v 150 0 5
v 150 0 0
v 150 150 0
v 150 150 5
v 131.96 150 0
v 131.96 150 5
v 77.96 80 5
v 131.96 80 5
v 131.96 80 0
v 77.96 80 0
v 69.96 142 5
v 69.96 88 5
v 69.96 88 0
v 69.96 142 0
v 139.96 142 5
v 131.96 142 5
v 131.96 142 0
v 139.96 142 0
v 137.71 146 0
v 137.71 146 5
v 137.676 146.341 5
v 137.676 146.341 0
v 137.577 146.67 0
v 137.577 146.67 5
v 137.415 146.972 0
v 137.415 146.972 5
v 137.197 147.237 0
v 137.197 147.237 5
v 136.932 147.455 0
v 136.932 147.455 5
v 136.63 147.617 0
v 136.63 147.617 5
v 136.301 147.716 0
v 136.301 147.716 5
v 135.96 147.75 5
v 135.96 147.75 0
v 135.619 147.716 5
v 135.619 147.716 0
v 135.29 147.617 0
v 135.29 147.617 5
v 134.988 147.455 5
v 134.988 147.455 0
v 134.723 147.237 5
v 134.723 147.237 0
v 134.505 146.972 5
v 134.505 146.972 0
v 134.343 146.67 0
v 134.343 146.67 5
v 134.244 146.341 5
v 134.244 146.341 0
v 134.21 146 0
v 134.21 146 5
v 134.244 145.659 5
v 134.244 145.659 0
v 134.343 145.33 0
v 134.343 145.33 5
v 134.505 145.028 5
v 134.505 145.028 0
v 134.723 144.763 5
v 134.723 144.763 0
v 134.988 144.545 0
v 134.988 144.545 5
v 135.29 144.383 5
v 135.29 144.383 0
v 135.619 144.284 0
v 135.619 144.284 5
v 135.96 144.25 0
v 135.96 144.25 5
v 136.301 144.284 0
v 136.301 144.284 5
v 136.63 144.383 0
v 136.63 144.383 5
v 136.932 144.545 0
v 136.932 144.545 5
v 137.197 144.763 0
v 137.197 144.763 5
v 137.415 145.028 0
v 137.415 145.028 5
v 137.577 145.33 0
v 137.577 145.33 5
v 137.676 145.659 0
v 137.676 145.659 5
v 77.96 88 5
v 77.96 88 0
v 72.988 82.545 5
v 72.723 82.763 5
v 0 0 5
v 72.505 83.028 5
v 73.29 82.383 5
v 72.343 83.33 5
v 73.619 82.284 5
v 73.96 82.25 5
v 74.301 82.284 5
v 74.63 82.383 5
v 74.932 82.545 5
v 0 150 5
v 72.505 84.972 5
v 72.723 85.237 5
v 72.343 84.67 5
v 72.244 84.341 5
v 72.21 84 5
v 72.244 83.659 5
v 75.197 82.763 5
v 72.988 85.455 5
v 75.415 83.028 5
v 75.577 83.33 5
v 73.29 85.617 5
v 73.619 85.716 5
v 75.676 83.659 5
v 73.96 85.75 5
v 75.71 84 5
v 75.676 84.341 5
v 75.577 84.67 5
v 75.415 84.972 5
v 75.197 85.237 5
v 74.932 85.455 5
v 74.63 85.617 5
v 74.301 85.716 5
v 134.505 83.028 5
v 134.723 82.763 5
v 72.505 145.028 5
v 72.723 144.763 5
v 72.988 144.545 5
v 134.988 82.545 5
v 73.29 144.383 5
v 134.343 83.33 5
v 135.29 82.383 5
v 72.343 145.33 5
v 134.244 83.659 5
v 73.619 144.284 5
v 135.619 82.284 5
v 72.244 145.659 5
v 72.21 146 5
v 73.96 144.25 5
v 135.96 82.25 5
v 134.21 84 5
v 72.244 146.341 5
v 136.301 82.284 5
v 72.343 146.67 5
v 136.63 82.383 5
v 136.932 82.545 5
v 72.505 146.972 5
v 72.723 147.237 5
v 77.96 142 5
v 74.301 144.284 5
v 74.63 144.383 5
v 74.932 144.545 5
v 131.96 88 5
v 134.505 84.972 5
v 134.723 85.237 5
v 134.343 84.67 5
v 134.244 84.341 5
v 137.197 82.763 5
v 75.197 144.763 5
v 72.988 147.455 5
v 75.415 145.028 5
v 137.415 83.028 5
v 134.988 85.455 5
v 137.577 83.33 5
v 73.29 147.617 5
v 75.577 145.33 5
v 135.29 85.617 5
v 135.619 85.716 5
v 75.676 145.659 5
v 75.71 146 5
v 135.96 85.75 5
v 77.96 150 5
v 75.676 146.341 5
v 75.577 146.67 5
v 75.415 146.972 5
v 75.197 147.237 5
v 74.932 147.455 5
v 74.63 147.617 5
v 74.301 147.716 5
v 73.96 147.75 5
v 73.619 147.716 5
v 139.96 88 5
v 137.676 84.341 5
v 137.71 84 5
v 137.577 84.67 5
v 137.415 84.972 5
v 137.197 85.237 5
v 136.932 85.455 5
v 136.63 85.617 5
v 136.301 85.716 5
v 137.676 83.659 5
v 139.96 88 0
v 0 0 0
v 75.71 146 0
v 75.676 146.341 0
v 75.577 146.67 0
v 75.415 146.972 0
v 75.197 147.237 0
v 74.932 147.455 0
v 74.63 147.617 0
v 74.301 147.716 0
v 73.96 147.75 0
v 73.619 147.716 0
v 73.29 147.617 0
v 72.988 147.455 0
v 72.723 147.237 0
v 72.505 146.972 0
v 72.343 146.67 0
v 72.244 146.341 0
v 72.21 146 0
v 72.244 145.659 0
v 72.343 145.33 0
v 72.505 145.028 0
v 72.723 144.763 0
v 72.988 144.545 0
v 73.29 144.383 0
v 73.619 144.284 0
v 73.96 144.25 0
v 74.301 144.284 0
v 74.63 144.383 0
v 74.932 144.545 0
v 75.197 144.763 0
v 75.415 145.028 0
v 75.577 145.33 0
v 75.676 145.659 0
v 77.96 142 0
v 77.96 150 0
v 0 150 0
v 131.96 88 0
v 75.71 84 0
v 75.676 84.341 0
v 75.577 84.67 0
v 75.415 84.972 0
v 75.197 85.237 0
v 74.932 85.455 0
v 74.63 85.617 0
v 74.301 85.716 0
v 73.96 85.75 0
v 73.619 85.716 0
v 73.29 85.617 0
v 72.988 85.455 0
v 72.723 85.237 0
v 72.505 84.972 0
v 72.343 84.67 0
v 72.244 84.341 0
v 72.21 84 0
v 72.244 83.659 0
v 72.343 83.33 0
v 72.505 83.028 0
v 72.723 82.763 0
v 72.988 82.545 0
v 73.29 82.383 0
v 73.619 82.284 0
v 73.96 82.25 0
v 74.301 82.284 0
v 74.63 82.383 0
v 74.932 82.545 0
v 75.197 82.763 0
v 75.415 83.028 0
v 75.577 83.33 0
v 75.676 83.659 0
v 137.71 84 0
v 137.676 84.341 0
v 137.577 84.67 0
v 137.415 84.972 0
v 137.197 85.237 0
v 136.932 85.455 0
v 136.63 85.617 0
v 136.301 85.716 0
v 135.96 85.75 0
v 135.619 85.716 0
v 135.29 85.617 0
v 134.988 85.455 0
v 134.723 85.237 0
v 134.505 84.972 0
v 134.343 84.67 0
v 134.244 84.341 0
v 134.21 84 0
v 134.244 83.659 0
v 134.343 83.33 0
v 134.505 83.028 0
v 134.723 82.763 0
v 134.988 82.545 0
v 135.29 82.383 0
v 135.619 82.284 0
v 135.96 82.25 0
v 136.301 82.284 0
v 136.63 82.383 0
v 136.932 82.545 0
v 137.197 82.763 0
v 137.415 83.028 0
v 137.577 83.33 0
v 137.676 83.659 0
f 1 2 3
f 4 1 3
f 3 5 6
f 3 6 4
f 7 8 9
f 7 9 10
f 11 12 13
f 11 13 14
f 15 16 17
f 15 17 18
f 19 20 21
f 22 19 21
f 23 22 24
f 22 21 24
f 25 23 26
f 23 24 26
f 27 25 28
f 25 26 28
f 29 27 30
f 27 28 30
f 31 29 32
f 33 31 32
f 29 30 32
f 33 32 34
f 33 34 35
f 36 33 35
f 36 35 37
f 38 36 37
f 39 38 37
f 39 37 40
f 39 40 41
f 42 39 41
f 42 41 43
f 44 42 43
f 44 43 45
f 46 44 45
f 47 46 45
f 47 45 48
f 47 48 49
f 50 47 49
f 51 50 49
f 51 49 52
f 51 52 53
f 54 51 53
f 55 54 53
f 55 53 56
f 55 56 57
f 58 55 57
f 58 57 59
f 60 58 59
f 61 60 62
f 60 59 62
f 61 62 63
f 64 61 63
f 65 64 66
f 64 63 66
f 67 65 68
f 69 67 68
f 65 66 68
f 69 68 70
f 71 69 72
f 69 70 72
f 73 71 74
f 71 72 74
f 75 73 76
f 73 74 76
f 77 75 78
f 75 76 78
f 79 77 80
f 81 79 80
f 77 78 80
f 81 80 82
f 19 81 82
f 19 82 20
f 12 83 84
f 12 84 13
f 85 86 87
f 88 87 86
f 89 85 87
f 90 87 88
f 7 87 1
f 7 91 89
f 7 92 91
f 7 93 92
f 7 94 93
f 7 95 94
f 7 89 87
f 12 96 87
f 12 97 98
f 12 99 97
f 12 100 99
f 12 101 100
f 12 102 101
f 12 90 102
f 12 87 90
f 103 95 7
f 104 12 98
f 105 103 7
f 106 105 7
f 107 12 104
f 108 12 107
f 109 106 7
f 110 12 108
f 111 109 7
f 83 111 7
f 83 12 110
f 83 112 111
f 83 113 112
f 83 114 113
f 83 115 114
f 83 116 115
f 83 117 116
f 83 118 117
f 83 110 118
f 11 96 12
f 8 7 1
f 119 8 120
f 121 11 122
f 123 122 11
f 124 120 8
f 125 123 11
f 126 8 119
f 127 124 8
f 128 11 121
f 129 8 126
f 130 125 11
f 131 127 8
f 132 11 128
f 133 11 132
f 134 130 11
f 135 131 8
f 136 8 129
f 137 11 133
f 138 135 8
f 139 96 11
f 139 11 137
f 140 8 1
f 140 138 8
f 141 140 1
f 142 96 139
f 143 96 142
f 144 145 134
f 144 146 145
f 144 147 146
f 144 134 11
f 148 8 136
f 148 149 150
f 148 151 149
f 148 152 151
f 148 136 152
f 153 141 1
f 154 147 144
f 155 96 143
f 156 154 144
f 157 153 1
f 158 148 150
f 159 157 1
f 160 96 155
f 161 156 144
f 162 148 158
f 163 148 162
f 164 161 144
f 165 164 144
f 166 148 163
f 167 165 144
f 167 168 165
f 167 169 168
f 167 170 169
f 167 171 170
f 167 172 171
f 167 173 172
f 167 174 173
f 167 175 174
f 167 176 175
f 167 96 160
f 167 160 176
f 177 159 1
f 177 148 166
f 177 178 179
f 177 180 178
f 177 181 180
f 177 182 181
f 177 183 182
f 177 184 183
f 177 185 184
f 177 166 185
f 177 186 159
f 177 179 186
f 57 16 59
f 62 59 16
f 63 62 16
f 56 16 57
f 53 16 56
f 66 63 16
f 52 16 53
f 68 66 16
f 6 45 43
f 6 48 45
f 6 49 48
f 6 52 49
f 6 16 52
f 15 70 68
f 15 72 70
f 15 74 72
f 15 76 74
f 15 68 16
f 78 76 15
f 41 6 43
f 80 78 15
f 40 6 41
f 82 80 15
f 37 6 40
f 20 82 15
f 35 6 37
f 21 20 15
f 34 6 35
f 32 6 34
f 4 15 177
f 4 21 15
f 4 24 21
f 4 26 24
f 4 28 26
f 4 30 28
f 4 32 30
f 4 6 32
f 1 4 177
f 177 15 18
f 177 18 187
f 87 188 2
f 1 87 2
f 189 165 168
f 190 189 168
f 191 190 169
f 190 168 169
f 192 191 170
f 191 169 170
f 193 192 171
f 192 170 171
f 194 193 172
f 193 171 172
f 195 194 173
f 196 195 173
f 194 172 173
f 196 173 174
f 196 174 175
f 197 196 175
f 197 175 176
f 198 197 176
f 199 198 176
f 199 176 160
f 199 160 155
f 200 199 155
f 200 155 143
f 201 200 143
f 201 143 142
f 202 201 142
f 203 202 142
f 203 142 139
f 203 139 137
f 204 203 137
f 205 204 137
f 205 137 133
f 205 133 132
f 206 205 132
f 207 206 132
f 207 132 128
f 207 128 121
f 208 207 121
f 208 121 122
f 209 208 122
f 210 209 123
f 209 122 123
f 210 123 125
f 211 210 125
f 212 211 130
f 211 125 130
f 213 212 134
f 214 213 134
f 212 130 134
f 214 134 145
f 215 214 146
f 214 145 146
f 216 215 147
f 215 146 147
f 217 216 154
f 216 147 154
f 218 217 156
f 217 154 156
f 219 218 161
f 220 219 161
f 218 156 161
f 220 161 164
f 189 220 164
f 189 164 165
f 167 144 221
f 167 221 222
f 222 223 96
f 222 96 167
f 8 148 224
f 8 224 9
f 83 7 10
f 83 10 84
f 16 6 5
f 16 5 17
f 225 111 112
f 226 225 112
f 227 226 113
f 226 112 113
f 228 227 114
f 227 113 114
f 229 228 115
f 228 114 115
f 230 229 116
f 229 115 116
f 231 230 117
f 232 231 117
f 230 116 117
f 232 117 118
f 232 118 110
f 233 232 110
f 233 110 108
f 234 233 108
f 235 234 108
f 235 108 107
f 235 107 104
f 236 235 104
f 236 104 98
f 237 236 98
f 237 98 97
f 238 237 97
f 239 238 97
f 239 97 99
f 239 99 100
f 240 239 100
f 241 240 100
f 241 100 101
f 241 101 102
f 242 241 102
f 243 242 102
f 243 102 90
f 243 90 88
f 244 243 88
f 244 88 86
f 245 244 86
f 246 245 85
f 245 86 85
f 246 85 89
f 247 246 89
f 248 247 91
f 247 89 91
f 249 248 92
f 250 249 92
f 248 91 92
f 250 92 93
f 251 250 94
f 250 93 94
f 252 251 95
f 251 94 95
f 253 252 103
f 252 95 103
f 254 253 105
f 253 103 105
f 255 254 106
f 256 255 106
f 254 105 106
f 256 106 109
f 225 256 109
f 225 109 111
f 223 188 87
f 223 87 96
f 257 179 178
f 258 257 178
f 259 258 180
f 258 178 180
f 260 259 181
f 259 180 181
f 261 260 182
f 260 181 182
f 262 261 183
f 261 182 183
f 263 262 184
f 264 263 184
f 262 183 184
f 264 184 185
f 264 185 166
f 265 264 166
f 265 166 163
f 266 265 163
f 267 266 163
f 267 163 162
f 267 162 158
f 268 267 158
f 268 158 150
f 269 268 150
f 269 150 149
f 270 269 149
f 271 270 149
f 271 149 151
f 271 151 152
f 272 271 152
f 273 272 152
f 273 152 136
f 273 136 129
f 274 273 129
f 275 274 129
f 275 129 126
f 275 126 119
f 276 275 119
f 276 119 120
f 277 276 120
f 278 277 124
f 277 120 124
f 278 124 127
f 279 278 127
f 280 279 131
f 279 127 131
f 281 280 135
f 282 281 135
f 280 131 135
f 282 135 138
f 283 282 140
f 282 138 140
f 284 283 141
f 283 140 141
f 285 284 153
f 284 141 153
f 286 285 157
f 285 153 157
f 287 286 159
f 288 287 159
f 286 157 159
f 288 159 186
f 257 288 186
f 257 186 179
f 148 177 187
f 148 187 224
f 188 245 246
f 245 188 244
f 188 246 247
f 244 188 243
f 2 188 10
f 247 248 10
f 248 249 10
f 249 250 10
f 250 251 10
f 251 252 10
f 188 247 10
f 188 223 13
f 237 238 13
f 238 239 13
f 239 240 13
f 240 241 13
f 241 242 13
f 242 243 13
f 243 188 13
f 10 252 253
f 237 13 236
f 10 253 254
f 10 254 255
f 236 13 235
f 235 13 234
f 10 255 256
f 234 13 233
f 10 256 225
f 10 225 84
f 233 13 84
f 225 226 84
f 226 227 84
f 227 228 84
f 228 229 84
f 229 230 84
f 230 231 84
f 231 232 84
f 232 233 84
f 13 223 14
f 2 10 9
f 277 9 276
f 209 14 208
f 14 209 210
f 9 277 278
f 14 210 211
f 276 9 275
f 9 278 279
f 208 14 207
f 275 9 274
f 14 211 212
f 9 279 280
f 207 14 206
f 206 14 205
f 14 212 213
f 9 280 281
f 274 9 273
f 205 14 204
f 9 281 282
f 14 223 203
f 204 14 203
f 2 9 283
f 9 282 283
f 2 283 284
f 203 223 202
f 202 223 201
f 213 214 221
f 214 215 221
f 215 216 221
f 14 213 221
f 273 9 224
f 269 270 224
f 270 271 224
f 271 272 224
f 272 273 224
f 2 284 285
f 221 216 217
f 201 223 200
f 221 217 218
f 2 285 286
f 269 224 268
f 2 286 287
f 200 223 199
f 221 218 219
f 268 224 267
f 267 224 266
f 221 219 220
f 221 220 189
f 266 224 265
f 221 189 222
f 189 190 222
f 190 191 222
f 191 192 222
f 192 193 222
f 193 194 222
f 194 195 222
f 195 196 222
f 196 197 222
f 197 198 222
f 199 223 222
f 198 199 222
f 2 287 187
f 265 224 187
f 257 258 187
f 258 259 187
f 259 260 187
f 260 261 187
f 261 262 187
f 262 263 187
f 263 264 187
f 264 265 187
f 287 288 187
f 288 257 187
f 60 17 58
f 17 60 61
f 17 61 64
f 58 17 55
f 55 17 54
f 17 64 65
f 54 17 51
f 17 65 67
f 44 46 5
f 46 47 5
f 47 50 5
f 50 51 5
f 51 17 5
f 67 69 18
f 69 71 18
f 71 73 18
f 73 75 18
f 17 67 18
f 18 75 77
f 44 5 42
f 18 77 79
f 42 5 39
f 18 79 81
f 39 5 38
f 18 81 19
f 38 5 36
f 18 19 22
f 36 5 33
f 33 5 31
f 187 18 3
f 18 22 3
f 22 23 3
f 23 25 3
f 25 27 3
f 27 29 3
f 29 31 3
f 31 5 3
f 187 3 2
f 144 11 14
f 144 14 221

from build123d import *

# Parameters (mm, degrees)
SKETCH1_W           = 150
SKETCH1_H           = 150
BOSS_EXTRUDE1_DEPTH = 5
SKETCH2_R           = 1.75
CUT_EXTRUDE1_DEPTH  = 213.190951739


with BuildPart() as part:
    # Sketch1 → Boss-Extrude1 (new body)
    with BuildSketch(Plane.XY):
        with Locations((75, 75)):
            Rectangle(SKETCH1_W, SKETCH1_H)
    extrude(amount=BOSS_EXTRUDE1_DEPTH)

    # Sketch2 → Cut-Extrude1 (cut, through all)
    with BuildSketch(Plane.XY.offset(5)):
        with Locations((73.960018565, 84)):
            Circle(SKETCH2_R)
        with Locations((73.960018565, 146)):
            Circle(SKETCH2_R)
        with Locations((135.960018565, 146)):
            Circle(SKETCH2_R)
        with Locations((135.960018565, 84)):
            Circle(SKETCH2_R)
        Polygon((77.960018565, 150), (131.960018565, 150), (131.960018565, 142), (139.960018565, 142), (139.960018565, 88), (131.960018565, 88), (131.960018565, 80), (77.960018565, 80), (77.960018565, 88), (69.960018565, 88), (69.960018565, 142), (77.960018565, 142), align=None)
    extrude(amount=-CUT_EXTRUDE1_DEPTH, mode=Mode.SUBTRACT)


solid = part.part
